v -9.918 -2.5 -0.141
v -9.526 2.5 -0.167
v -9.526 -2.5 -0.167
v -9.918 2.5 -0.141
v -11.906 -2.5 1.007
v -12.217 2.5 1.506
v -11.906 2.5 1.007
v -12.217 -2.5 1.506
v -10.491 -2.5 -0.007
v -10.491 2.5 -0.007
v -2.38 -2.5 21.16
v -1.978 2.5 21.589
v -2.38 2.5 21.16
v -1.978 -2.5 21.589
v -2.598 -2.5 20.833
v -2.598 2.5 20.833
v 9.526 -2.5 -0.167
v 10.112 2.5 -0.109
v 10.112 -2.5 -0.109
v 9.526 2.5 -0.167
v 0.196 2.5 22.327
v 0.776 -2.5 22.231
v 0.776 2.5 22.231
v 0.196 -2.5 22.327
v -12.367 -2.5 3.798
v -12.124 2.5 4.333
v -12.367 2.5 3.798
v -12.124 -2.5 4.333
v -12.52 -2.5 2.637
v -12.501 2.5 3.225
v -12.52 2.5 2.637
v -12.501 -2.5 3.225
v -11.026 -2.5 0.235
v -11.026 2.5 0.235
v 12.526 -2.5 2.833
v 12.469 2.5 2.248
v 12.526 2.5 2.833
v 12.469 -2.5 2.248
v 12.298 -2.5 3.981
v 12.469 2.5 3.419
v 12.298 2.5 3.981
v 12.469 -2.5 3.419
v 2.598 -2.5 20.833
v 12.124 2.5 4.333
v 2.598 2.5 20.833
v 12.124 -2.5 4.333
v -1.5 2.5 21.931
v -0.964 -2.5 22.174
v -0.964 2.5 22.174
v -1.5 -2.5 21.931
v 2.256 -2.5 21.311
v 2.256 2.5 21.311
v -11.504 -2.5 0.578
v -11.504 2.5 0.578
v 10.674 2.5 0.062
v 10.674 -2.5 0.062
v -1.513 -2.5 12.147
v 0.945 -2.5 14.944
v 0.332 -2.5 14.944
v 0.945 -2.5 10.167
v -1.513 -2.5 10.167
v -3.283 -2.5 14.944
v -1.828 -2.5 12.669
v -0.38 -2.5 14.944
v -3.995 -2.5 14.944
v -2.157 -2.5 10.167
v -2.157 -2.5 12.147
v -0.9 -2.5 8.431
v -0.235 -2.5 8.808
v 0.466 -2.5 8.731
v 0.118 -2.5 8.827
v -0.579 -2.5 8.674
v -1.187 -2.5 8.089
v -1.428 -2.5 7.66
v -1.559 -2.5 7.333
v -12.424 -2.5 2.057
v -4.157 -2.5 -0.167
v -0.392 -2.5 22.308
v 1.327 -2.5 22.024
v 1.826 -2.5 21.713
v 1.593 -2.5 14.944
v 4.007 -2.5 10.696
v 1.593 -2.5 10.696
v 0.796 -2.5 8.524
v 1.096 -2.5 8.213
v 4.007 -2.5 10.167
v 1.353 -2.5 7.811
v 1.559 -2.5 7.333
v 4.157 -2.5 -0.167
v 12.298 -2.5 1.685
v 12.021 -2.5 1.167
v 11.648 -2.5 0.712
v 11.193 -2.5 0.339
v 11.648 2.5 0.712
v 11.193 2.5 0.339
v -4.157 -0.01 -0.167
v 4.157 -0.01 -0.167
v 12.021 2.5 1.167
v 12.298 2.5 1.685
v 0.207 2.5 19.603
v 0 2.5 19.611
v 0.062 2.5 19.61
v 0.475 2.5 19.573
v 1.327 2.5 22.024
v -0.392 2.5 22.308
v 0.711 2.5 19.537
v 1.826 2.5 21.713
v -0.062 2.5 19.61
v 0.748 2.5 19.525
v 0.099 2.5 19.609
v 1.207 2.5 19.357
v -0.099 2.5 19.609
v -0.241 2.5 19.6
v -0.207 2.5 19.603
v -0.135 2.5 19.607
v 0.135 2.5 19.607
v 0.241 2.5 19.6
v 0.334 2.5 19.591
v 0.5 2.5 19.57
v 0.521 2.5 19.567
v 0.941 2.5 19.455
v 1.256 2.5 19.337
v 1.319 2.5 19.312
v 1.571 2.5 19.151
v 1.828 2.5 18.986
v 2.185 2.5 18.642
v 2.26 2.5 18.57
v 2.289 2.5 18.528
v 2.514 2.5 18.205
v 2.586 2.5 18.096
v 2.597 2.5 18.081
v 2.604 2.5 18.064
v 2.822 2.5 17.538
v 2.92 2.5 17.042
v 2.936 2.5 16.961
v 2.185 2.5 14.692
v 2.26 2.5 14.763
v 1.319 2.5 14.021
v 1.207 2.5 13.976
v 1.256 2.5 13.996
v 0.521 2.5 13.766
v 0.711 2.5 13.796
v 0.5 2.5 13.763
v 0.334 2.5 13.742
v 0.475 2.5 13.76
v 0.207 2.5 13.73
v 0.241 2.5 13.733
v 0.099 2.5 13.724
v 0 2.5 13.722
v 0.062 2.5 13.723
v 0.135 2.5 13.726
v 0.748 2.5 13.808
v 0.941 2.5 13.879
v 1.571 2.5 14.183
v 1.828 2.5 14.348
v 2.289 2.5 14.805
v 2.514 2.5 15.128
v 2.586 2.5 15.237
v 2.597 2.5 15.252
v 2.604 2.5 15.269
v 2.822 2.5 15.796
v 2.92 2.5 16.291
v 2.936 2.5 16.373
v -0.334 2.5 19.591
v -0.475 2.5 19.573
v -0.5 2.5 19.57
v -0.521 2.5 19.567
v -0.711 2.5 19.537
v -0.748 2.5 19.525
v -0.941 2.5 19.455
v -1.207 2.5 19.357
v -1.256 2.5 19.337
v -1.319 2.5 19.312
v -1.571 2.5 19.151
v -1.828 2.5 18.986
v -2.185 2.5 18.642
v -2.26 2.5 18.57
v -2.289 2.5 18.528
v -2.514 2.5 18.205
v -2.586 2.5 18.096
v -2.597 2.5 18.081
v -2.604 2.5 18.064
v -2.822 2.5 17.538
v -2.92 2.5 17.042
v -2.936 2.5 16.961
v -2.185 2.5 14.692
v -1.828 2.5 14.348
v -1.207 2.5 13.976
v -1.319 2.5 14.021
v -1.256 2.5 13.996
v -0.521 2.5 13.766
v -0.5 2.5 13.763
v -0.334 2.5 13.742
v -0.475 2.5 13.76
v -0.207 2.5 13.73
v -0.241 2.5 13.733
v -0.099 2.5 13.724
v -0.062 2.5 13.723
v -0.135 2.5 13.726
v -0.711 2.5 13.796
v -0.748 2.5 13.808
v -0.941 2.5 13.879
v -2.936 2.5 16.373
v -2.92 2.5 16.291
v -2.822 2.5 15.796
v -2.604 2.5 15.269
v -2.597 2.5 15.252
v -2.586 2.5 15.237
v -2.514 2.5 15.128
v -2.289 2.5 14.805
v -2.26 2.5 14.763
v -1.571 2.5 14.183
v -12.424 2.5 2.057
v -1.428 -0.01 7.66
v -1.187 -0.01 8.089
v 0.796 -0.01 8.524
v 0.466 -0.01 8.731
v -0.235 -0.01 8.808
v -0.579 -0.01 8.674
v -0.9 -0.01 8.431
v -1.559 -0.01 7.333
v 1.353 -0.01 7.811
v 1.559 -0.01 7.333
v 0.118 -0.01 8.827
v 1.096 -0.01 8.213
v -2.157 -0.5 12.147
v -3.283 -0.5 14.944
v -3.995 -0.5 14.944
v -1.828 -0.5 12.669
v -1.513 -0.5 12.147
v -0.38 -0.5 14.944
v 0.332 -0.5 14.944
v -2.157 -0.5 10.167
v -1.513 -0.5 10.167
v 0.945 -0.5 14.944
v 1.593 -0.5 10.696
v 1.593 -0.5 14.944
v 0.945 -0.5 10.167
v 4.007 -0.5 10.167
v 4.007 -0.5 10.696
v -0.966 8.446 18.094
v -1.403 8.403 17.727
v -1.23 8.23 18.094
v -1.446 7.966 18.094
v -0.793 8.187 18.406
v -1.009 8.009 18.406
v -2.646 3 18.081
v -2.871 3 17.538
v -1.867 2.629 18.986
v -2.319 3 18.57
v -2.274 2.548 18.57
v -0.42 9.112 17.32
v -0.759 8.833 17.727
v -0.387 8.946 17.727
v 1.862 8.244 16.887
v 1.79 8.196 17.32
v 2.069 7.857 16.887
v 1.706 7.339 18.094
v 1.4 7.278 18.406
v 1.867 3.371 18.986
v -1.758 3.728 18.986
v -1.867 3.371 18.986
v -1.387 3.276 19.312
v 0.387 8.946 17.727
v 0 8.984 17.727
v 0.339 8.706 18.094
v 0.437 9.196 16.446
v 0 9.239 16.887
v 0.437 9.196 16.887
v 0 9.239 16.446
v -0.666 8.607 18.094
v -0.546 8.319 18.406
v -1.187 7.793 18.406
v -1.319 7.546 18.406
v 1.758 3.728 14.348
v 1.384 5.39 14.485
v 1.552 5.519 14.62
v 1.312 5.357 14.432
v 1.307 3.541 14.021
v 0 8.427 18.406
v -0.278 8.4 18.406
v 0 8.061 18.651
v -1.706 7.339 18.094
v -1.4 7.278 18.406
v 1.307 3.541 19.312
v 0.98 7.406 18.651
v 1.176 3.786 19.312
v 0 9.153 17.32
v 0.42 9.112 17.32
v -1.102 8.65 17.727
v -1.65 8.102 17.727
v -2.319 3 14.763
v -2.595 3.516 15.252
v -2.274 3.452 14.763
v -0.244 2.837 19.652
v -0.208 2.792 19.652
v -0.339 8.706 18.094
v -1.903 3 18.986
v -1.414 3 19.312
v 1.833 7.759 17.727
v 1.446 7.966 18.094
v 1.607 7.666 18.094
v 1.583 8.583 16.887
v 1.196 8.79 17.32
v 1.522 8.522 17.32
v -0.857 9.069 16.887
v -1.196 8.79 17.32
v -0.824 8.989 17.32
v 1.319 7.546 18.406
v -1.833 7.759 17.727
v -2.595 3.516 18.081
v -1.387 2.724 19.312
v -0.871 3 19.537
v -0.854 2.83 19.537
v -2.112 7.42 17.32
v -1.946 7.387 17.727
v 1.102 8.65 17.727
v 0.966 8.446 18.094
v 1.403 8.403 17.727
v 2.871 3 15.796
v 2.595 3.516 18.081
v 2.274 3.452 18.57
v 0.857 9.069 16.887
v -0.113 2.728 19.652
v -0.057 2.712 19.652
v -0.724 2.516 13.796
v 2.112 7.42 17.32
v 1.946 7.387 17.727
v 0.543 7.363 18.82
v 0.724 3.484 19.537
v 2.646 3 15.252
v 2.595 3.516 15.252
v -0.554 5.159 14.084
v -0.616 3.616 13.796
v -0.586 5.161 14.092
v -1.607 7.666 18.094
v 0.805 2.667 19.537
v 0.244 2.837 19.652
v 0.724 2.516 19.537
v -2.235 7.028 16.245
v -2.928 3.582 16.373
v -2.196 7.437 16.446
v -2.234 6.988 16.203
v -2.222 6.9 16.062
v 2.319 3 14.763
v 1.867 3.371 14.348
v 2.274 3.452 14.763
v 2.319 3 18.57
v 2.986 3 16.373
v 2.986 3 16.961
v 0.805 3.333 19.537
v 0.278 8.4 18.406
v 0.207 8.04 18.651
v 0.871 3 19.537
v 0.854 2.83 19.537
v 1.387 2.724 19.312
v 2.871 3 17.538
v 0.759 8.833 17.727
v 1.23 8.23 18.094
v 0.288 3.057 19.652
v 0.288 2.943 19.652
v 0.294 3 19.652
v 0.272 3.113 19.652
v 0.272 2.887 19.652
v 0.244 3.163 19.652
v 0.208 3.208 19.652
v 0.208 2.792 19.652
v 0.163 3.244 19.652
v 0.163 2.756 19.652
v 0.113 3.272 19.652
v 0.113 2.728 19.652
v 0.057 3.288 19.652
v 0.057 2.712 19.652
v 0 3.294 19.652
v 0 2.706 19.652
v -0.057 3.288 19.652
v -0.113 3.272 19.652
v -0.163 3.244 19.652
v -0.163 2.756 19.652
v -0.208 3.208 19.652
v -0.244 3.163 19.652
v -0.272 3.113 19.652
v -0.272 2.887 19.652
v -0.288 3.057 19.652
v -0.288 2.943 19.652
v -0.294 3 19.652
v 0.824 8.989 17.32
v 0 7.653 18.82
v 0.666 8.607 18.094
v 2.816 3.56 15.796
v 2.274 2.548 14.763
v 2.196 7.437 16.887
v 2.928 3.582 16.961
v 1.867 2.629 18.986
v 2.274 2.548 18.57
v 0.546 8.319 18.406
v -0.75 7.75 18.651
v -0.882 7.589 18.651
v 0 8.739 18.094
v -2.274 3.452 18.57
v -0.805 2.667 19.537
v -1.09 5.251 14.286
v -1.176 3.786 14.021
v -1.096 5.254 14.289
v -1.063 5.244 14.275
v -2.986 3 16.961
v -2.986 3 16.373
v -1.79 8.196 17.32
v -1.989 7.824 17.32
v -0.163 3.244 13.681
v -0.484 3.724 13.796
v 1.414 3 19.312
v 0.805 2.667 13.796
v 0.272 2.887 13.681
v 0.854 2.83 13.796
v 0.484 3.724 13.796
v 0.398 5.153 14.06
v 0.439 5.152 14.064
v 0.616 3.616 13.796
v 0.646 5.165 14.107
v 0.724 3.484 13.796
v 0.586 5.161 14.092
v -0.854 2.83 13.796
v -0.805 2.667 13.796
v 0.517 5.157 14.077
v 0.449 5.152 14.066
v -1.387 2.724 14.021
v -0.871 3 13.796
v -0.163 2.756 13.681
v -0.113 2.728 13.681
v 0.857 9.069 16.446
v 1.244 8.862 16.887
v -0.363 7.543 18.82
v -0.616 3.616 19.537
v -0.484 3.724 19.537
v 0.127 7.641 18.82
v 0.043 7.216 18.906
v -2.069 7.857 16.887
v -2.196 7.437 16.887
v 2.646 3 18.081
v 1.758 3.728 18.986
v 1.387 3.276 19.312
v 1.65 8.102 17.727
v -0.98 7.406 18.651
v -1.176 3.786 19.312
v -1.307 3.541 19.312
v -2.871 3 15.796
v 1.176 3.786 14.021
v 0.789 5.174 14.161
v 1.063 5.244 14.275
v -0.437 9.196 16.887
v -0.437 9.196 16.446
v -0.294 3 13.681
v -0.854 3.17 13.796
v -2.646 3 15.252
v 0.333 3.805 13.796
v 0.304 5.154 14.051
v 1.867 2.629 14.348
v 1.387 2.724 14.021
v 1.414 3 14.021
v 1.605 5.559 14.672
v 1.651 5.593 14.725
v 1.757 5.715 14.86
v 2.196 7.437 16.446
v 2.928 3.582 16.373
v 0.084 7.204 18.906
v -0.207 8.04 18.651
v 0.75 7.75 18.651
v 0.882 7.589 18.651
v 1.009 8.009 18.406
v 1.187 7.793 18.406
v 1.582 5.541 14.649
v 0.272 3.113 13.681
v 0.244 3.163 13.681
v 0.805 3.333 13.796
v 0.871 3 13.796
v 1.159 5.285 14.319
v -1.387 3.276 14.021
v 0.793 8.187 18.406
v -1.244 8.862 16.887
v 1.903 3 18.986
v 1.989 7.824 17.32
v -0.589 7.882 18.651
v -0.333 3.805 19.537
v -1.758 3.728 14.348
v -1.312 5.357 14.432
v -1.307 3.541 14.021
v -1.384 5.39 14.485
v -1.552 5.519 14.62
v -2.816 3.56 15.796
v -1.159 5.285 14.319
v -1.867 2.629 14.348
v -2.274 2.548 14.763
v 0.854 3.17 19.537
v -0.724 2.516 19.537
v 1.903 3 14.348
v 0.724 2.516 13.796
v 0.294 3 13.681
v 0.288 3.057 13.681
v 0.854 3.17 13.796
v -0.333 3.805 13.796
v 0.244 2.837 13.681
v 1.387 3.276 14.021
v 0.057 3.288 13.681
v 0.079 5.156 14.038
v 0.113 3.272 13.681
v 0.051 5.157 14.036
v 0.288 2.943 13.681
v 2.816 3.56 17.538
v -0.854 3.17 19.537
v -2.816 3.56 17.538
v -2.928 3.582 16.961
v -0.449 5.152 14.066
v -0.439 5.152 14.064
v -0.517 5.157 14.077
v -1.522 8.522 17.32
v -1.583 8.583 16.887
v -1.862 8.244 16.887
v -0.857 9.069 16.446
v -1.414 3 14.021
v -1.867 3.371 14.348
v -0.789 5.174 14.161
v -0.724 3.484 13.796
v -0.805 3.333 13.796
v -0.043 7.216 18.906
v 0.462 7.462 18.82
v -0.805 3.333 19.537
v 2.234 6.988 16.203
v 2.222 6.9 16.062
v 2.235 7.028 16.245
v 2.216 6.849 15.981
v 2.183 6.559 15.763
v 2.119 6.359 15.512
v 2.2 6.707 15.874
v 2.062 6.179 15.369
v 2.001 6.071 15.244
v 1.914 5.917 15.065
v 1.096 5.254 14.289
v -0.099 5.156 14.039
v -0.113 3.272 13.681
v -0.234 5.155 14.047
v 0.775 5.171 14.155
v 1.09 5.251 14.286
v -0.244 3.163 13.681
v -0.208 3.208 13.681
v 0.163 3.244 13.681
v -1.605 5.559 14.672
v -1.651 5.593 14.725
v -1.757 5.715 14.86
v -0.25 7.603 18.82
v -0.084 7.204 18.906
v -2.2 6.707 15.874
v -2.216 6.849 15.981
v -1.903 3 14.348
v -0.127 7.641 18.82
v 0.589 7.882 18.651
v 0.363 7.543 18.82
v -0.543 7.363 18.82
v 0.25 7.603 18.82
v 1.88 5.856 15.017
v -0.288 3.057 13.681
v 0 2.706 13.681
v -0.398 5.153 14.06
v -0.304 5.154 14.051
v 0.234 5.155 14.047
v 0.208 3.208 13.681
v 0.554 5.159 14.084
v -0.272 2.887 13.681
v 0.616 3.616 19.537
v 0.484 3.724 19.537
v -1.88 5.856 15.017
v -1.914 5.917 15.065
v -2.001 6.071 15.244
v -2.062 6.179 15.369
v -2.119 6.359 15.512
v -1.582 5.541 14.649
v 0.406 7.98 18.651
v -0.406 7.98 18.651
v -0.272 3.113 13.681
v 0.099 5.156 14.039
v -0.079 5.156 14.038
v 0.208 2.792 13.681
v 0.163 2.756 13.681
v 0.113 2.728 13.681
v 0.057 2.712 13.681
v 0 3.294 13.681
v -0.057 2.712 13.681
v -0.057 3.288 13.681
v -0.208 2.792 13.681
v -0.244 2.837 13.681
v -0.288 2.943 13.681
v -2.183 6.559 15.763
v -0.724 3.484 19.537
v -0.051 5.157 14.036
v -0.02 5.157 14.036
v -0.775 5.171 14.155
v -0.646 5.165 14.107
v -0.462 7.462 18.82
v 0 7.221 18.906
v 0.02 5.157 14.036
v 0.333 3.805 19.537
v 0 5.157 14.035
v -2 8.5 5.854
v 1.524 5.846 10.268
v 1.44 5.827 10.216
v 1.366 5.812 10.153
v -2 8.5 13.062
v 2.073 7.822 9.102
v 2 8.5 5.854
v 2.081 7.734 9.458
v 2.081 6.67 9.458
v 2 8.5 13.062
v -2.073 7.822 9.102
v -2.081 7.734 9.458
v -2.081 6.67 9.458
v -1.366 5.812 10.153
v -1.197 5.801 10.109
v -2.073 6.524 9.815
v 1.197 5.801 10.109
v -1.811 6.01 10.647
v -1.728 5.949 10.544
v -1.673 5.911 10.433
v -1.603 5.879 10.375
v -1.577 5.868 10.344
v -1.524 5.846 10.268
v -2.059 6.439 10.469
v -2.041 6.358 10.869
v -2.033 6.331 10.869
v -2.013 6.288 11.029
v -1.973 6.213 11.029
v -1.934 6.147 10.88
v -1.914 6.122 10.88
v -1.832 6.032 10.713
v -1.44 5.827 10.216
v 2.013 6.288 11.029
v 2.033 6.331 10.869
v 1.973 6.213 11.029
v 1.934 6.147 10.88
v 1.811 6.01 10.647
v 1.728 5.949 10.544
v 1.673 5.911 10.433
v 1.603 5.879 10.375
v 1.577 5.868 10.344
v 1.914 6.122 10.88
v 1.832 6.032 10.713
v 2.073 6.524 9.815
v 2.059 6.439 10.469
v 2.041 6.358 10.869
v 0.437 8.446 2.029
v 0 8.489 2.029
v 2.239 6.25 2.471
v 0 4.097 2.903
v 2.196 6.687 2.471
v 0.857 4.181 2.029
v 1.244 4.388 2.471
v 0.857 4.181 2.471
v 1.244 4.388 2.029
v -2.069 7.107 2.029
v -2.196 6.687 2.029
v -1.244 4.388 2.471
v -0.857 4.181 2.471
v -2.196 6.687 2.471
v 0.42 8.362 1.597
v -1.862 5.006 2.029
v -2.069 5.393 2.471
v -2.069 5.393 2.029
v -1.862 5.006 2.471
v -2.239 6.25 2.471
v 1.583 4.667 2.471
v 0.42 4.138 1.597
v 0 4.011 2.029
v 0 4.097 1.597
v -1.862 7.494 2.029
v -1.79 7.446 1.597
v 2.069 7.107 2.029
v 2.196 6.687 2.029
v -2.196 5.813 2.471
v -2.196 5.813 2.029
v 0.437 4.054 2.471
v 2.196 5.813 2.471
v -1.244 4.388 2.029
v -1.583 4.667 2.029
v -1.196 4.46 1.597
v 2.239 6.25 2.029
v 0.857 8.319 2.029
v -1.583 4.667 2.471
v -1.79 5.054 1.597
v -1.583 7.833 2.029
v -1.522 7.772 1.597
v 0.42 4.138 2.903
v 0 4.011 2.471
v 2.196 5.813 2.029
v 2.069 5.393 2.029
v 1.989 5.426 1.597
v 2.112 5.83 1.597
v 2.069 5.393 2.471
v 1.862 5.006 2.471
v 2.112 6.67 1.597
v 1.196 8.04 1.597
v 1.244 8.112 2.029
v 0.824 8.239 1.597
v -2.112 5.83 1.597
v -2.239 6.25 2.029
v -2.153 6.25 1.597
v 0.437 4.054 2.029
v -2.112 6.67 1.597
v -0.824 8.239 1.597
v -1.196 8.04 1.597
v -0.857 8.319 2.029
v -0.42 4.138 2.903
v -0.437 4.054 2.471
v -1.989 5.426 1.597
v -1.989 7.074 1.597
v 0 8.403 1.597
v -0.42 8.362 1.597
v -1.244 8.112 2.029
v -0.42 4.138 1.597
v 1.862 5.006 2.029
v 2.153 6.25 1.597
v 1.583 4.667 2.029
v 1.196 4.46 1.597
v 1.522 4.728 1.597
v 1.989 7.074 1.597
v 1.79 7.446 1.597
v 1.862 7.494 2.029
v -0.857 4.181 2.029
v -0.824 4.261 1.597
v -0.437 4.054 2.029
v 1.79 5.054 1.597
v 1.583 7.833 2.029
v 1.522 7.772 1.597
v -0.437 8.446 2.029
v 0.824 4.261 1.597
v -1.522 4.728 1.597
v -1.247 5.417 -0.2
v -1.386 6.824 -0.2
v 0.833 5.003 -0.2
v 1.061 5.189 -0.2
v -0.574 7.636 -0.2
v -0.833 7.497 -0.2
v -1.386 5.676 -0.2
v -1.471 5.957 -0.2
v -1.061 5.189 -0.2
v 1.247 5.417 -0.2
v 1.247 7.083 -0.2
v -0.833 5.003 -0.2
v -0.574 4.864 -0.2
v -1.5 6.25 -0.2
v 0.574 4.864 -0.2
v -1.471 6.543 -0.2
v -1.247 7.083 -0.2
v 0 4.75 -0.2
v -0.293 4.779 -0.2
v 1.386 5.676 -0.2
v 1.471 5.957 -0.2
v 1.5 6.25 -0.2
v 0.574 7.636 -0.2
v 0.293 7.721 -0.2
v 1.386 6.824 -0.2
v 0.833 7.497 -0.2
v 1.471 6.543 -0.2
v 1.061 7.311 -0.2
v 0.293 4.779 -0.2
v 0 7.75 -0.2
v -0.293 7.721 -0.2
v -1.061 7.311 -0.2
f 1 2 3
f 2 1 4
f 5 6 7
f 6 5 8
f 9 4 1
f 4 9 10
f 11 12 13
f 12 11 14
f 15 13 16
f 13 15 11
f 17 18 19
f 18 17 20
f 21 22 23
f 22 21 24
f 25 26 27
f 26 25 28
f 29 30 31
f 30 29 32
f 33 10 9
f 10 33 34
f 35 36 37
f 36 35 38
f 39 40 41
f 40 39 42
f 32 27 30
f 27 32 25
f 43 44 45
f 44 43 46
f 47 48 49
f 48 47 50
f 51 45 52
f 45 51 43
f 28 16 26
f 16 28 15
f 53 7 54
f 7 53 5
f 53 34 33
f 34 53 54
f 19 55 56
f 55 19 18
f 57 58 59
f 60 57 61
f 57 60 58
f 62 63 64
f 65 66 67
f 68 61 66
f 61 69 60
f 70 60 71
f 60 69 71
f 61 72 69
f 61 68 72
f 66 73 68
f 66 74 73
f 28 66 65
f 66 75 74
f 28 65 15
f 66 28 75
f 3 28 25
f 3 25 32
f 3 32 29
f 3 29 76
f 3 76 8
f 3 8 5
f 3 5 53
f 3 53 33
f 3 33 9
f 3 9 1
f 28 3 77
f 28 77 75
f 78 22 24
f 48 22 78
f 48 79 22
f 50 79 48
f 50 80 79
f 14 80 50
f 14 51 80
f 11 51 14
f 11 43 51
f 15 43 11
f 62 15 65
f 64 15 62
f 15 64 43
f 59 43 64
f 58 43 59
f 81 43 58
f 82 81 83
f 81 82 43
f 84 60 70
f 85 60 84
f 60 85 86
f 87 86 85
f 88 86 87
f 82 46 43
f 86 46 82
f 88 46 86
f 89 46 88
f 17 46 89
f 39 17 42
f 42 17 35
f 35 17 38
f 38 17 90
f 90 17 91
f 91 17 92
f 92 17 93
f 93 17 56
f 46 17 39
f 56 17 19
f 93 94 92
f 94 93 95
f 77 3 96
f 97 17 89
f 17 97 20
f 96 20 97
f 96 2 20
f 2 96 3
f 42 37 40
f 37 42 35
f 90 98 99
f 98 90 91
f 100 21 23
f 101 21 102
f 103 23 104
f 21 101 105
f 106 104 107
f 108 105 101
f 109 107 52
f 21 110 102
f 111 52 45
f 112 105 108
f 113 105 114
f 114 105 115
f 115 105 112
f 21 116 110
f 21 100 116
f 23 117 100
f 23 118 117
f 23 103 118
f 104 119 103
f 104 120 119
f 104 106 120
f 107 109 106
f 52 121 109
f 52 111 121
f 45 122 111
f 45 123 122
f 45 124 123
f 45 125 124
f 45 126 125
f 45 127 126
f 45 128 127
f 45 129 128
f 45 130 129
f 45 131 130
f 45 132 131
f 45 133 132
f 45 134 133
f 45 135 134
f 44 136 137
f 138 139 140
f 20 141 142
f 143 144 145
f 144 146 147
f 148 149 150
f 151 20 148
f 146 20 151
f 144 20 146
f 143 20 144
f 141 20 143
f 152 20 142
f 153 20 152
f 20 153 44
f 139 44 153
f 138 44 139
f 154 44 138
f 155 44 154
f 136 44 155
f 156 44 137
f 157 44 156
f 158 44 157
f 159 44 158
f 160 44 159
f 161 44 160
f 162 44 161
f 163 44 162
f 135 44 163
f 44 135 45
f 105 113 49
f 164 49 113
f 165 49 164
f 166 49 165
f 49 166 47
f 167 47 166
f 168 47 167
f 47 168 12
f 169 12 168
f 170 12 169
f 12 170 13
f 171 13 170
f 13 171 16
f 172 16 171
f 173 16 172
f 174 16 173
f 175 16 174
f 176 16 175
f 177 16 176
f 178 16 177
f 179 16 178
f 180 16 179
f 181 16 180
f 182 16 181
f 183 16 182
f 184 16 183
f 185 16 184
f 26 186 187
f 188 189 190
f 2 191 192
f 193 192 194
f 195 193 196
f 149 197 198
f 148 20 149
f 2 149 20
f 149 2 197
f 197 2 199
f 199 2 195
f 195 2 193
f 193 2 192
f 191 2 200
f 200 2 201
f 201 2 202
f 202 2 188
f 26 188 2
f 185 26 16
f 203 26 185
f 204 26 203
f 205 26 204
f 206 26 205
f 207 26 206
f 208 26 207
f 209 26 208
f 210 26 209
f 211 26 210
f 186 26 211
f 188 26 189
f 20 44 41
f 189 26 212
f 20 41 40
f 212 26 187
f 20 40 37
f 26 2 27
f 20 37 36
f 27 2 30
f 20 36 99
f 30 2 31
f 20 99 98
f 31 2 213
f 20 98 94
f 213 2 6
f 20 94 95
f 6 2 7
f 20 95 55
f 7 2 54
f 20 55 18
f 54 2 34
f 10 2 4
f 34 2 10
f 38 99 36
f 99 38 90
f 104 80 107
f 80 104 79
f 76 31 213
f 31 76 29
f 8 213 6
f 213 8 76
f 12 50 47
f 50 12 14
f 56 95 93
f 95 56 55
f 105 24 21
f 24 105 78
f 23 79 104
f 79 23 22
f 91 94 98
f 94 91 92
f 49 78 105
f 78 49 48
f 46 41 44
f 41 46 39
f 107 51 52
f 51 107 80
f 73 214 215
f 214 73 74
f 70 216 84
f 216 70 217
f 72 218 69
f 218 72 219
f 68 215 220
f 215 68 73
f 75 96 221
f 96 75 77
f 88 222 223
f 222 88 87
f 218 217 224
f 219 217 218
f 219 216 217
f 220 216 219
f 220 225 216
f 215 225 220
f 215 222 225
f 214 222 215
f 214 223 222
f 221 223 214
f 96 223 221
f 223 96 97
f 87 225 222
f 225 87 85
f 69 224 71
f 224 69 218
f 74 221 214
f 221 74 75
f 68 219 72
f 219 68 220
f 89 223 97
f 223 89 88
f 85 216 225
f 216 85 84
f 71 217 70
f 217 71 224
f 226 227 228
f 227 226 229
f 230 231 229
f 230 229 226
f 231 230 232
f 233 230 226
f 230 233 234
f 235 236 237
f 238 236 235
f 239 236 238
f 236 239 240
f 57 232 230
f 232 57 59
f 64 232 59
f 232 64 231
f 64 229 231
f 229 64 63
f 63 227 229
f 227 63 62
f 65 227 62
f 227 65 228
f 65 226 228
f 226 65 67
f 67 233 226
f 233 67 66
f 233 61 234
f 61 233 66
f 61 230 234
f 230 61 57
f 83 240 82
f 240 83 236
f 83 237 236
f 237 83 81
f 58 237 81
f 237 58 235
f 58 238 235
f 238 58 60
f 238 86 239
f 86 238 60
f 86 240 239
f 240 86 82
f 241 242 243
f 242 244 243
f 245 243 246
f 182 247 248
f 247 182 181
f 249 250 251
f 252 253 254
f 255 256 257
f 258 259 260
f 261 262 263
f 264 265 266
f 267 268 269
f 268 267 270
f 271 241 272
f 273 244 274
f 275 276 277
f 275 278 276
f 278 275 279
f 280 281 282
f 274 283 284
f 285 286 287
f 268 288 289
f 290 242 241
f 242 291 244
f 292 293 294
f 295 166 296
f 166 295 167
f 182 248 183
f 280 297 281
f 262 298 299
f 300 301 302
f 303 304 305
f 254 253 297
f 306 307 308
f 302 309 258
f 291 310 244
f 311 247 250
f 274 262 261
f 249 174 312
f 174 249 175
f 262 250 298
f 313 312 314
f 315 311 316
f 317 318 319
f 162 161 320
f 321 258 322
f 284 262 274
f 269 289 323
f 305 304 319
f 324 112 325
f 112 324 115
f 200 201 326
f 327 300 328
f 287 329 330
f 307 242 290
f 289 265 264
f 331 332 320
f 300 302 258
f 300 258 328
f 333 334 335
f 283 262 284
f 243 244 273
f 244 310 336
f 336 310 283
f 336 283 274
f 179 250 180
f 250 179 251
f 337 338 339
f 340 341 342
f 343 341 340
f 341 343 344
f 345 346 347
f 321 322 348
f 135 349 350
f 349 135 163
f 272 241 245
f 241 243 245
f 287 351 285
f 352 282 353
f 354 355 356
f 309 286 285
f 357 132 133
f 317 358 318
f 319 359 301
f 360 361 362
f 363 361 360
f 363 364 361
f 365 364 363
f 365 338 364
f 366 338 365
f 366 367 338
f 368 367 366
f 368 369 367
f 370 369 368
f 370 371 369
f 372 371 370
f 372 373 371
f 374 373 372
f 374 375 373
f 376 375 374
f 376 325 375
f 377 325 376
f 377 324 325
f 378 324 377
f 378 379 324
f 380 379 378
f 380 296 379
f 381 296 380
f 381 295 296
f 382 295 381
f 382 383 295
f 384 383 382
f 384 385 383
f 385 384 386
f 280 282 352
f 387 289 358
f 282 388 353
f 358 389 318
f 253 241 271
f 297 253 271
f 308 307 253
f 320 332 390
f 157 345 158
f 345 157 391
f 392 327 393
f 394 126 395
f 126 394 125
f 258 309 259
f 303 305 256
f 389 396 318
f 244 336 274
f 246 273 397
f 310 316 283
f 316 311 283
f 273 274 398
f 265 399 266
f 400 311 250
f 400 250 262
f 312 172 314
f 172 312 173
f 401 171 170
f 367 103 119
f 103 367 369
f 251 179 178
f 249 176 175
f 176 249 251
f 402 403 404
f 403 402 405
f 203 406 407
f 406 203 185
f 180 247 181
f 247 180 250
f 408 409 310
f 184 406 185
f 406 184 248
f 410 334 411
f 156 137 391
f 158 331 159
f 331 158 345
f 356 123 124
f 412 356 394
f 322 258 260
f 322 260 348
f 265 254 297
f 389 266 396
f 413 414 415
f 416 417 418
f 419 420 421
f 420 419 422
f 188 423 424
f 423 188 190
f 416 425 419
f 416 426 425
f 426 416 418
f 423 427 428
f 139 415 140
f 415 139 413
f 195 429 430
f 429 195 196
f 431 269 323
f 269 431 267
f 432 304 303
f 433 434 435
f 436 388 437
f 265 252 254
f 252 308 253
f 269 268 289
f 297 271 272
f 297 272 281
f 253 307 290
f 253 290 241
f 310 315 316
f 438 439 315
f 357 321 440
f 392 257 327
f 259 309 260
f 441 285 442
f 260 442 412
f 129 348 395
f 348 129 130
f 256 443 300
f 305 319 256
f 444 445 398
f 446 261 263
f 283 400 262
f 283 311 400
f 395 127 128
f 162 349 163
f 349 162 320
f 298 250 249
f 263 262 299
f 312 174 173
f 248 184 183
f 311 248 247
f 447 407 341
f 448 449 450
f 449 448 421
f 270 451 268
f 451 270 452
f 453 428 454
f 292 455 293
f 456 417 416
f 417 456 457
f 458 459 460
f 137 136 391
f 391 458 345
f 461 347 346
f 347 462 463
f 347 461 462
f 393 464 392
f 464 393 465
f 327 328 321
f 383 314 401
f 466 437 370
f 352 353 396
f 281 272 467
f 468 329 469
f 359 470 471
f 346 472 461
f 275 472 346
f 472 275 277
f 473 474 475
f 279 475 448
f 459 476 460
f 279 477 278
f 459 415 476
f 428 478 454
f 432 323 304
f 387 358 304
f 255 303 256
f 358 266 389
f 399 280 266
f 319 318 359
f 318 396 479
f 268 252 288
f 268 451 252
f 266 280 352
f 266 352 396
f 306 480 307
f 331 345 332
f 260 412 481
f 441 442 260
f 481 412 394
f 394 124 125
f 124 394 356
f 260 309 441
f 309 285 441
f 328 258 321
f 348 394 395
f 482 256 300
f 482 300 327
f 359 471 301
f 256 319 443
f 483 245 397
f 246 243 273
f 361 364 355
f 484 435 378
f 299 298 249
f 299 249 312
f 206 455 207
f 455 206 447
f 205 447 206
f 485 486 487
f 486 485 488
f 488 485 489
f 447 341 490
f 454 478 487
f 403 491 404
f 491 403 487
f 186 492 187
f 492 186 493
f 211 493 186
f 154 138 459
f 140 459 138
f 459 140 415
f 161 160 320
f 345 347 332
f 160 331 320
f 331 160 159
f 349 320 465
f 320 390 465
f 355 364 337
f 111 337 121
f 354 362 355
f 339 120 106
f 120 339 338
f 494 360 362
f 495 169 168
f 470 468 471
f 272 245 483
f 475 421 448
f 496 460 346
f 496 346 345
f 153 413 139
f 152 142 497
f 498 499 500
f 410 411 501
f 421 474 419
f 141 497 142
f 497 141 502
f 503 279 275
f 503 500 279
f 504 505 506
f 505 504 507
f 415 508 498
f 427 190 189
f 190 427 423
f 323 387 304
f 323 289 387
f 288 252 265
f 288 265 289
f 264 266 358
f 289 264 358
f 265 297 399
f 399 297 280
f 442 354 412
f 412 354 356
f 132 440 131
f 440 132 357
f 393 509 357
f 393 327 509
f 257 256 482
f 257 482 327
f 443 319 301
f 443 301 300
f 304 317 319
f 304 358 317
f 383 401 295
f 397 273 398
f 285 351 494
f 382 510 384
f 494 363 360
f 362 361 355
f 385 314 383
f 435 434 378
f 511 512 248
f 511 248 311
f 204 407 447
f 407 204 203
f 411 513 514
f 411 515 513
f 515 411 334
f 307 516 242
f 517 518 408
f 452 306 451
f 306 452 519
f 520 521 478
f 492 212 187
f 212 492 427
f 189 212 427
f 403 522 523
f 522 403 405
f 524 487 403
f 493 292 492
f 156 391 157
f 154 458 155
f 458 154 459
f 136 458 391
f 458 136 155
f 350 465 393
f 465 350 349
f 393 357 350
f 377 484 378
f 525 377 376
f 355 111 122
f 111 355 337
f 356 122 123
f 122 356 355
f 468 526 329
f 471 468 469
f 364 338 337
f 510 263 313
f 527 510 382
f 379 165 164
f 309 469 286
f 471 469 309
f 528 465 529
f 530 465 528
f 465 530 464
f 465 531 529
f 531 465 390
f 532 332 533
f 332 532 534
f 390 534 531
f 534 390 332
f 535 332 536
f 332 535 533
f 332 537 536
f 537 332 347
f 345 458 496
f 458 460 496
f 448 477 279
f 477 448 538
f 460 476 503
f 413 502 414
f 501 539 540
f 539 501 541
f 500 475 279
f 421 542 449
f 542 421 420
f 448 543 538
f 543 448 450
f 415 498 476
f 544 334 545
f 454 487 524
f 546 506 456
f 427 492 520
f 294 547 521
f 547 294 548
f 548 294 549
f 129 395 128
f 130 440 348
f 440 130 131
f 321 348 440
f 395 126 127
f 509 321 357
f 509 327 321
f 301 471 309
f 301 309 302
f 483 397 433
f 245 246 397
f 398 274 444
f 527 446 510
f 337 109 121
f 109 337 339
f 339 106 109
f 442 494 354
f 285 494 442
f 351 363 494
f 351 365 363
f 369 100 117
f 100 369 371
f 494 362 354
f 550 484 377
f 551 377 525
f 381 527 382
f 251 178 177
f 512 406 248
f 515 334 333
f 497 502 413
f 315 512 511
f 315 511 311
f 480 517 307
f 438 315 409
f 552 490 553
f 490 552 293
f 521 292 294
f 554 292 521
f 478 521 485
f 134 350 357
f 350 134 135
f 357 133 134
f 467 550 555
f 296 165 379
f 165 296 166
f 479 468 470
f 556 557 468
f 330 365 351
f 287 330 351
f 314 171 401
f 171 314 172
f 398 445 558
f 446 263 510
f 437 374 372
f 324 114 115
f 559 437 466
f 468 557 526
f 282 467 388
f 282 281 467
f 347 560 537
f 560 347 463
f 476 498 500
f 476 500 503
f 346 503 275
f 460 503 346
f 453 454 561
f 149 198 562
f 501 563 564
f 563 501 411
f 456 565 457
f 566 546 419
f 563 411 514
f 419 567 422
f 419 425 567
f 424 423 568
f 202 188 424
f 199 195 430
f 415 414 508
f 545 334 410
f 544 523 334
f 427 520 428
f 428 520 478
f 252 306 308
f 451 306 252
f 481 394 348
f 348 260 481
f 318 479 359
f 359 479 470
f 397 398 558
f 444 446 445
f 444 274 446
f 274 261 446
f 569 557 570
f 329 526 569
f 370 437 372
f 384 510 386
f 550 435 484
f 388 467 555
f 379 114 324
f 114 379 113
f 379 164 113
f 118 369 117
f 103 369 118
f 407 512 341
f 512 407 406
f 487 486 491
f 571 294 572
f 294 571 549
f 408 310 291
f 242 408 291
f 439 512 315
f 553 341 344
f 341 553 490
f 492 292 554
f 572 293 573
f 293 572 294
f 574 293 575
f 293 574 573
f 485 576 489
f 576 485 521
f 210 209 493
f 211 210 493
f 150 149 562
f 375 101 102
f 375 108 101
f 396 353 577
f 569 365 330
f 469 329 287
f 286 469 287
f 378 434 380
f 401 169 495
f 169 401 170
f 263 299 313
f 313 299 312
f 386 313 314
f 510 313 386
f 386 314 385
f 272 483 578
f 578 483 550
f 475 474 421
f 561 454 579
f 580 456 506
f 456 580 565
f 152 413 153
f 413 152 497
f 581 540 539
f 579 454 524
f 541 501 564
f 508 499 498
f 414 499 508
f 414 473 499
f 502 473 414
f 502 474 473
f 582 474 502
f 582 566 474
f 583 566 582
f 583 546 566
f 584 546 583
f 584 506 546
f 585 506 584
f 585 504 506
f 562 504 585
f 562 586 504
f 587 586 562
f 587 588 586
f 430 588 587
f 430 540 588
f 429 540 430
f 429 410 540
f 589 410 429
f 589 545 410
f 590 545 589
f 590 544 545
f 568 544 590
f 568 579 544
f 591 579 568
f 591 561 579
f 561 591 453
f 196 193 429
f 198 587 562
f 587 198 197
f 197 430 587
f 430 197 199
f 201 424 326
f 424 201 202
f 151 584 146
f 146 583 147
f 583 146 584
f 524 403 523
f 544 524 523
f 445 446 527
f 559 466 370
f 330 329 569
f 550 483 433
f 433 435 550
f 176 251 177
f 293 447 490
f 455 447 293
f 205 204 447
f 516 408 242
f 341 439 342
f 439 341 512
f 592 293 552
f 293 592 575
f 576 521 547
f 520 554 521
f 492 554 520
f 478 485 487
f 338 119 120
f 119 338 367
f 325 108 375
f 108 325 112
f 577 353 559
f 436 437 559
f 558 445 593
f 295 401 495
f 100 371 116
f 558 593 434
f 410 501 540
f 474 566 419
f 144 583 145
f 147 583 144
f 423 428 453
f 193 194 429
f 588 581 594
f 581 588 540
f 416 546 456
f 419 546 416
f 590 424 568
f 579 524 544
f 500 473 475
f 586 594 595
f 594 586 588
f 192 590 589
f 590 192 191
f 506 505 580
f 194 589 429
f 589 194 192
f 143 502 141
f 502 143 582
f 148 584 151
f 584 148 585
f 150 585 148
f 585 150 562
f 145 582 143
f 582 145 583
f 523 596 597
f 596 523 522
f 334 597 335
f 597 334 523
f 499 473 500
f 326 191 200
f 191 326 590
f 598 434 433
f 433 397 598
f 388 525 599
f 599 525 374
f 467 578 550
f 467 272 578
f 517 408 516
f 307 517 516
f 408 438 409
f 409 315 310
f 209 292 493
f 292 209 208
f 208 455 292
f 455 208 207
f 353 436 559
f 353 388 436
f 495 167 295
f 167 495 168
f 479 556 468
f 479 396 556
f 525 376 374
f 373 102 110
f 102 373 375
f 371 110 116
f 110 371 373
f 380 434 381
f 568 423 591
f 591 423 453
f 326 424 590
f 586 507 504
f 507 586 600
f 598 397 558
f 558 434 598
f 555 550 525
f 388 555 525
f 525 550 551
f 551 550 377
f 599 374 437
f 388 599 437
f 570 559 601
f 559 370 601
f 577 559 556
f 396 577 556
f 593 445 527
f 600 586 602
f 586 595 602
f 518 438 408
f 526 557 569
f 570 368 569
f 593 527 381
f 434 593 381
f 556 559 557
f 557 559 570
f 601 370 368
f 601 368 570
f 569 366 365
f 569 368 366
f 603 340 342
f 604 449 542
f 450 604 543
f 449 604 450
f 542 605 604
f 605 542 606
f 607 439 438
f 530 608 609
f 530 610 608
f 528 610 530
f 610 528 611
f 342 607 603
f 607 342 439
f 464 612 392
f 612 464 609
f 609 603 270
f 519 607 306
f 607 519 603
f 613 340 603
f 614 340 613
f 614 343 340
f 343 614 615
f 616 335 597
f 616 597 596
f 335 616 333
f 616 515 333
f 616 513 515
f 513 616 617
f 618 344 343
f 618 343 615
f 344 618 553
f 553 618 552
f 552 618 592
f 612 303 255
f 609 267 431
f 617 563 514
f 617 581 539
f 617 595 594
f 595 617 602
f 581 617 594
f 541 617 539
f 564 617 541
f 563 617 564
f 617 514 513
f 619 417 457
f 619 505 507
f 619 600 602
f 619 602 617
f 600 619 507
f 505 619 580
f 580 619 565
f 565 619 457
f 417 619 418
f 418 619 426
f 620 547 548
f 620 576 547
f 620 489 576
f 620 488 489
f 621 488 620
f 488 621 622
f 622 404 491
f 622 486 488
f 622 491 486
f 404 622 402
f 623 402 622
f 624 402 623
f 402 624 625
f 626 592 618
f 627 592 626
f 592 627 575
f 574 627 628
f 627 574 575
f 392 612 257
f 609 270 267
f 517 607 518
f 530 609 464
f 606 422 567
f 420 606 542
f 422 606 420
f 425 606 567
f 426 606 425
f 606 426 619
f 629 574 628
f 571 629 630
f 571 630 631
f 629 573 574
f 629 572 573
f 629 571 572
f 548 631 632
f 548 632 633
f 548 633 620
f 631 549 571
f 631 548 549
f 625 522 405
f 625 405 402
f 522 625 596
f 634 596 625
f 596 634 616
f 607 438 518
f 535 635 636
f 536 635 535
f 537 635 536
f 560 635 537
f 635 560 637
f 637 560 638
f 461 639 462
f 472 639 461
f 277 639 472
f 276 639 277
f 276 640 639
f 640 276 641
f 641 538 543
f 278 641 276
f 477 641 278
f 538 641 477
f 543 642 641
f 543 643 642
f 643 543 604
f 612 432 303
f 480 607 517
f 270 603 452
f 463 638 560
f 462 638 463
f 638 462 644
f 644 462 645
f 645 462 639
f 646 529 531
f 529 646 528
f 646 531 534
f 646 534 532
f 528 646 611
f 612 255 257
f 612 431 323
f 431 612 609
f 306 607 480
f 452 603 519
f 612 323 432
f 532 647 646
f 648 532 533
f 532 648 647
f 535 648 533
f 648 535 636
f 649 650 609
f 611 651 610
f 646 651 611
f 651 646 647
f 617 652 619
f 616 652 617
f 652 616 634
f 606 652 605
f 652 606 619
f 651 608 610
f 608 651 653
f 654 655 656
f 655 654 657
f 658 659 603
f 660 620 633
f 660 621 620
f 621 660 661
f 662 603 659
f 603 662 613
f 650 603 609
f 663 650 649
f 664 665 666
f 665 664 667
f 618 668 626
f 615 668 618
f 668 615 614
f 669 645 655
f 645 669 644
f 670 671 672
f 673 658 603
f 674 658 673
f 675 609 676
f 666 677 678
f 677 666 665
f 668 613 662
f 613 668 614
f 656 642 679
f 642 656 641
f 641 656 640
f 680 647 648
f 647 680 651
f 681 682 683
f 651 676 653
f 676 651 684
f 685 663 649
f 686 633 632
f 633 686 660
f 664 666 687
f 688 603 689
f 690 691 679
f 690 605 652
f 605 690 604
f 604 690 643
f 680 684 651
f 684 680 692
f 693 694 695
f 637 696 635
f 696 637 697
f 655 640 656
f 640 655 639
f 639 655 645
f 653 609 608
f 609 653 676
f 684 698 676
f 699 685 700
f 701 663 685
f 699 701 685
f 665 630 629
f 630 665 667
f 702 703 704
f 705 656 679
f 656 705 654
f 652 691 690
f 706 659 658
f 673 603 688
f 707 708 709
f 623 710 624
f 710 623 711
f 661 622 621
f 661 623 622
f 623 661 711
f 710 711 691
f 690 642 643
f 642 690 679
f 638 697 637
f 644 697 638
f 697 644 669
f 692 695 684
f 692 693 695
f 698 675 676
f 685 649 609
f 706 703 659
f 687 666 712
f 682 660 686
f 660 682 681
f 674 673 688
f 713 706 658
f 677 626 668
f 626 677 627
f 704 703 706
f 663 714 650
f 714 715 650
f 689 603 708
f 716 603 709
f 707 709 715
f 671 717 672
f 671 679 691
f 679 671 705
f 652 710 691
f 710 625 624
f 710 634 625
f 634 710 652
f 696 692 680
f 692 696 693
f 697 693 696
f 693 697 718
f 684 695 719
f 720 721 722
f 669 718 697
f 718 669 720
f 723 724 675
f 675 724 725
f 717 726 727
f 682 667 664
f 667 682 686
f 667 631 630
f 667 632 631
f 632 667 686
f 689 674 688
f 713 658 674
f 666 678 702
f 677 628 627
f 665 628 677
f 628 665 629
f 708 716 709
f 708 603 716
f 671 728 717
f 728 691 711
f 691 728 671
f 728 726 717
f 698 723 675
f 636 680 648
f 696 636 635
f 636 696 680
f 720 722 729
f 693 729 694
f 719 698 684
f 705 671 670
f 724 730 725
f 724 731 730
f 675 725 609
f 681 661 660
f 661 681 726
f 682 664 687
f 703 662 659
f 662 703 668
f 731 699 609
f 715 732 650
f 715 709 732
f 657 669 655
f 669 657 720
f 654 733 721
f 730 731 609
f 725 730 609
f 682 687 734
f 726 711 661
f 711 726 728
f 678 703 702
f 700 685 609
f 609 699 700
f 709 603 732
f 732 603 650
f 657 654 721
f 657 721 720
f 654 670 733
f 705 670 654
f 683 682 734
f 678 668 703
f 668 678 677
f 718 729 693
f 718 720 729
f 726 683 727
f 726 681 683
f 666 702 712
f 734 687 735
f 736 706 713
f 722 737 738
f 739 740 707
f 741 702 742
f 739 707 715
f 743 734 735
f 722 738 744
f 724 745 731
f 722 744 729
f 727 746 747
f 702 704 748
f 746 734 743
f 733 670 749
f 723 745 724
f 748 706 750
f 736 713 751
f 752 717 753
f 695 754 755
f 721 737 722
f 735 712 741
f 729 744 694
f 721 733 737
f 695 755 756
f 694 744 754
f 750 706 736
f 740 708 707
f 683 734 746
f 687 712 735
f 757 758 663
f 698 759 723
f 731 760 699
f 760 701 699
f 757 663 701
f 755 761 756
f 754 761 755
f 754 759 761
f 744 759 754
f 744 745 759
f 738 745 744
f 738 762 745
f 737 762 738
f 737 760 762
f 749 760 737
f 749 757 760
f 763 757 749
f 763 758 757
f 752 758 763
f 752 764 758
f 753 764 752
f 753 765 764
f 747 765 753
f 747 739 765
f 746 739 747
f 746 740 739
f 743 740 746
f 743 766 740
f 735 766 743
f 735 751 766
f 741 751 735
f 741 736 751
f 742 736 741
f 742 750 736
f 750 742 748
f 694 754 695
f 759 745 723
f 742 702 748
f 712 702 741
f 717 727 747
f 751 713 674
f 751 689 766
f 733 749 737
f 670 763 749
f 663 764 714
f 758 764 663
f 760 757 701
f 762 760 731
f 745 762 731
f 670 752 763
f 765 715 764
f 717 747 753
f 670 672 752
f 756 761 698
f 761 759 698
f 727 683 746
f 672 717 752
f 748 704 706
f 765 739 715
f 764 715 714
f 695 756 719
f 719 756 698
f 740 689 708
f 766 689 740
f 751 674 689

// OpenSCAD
/* [Customize] */

// Your name initials
initials = "YL";

/* [Hidden] */
size = 25;
height = 5;
offset = 3;
door_size = 14;
door_y_offset = 8;
text_size = 5;
text_height = 2;
grip_depth = 6;
grip_thickness = 2;
grip_space = 1.5;
fudge = 0.001;
$fn = 32;

module marker() {
  translate([0, 0, size/3])
  rotate([90, 0, 0])
  translate([0, 0, -height/2])
  difference() {
    rotate([0, 0, -30])
    linear_extrude(height)
    offset(r = offset)
    circle(d = size - offset, $fn = 3);

    scale([.6, 1, 1])
    translate([0, -door_y_offset, height/2 + fudge*10])
    rotate([0, 0, -30])
    linear_extrude(height/2)
    offset(r = offset)
    circle(d = door_size - offset, $fn = 3);

    color("red")
    translate([0, size/3 - text_size*1.3, height - text_height])
    linear_extrude(text_height * 2)
    text(initials, size = text_size, halign = "center", valign = "baseline");
  }

  grip();
}

module grip() {
  grip_height = size * 2/3;
  grip_width = 5;
  grip_bottom_d = grip_depth - grip_space;
  grip_tab_height = grip_height - grip_bottom_d;

  hull_chain() {
    translate([0, grip_depth/2, grip_height])
    sphere(d = grip_depth);

    translate([0, height/2 + grip_depth/2*1.5, grip_height])
    sphere(d = grip_bottom_d);

    translate([0, height/2 + grip_thickness/2 + grip_depth - grip_thickness, grip_height/2 + grip_bottom_d/4])
    cube([grip_depth*2/3, grip_thickness, (grip_height - grip_bottom_d/2)/2], center = true);

    translate([0, height/2 + grip_thickness/2 + grip_depth - grip_thickness, grip_height/2 + grip_bottom_d/4])
    cube([grip_depth*2/3, grip_thickness, (grip_height - grip_bottom_d/2)/2], center = true);

    translate([0, height/2 + grip_space + grip_bottom_d/2, grip_bottom_d/2])
    sphere(d = grip_bottom_d);

    translate([0, height/2 + grip_space + grip_bottom_d/2, -0.2])
    cylinder(d = grip_bottom_d*2/3, h = grip_bottom_d);
  }
}

module hull_chain() {
  for (i = [0 : $children - 2]) {
    hull() {
      children(i);
      children(i + 1);
    }
  }
}

marker();
